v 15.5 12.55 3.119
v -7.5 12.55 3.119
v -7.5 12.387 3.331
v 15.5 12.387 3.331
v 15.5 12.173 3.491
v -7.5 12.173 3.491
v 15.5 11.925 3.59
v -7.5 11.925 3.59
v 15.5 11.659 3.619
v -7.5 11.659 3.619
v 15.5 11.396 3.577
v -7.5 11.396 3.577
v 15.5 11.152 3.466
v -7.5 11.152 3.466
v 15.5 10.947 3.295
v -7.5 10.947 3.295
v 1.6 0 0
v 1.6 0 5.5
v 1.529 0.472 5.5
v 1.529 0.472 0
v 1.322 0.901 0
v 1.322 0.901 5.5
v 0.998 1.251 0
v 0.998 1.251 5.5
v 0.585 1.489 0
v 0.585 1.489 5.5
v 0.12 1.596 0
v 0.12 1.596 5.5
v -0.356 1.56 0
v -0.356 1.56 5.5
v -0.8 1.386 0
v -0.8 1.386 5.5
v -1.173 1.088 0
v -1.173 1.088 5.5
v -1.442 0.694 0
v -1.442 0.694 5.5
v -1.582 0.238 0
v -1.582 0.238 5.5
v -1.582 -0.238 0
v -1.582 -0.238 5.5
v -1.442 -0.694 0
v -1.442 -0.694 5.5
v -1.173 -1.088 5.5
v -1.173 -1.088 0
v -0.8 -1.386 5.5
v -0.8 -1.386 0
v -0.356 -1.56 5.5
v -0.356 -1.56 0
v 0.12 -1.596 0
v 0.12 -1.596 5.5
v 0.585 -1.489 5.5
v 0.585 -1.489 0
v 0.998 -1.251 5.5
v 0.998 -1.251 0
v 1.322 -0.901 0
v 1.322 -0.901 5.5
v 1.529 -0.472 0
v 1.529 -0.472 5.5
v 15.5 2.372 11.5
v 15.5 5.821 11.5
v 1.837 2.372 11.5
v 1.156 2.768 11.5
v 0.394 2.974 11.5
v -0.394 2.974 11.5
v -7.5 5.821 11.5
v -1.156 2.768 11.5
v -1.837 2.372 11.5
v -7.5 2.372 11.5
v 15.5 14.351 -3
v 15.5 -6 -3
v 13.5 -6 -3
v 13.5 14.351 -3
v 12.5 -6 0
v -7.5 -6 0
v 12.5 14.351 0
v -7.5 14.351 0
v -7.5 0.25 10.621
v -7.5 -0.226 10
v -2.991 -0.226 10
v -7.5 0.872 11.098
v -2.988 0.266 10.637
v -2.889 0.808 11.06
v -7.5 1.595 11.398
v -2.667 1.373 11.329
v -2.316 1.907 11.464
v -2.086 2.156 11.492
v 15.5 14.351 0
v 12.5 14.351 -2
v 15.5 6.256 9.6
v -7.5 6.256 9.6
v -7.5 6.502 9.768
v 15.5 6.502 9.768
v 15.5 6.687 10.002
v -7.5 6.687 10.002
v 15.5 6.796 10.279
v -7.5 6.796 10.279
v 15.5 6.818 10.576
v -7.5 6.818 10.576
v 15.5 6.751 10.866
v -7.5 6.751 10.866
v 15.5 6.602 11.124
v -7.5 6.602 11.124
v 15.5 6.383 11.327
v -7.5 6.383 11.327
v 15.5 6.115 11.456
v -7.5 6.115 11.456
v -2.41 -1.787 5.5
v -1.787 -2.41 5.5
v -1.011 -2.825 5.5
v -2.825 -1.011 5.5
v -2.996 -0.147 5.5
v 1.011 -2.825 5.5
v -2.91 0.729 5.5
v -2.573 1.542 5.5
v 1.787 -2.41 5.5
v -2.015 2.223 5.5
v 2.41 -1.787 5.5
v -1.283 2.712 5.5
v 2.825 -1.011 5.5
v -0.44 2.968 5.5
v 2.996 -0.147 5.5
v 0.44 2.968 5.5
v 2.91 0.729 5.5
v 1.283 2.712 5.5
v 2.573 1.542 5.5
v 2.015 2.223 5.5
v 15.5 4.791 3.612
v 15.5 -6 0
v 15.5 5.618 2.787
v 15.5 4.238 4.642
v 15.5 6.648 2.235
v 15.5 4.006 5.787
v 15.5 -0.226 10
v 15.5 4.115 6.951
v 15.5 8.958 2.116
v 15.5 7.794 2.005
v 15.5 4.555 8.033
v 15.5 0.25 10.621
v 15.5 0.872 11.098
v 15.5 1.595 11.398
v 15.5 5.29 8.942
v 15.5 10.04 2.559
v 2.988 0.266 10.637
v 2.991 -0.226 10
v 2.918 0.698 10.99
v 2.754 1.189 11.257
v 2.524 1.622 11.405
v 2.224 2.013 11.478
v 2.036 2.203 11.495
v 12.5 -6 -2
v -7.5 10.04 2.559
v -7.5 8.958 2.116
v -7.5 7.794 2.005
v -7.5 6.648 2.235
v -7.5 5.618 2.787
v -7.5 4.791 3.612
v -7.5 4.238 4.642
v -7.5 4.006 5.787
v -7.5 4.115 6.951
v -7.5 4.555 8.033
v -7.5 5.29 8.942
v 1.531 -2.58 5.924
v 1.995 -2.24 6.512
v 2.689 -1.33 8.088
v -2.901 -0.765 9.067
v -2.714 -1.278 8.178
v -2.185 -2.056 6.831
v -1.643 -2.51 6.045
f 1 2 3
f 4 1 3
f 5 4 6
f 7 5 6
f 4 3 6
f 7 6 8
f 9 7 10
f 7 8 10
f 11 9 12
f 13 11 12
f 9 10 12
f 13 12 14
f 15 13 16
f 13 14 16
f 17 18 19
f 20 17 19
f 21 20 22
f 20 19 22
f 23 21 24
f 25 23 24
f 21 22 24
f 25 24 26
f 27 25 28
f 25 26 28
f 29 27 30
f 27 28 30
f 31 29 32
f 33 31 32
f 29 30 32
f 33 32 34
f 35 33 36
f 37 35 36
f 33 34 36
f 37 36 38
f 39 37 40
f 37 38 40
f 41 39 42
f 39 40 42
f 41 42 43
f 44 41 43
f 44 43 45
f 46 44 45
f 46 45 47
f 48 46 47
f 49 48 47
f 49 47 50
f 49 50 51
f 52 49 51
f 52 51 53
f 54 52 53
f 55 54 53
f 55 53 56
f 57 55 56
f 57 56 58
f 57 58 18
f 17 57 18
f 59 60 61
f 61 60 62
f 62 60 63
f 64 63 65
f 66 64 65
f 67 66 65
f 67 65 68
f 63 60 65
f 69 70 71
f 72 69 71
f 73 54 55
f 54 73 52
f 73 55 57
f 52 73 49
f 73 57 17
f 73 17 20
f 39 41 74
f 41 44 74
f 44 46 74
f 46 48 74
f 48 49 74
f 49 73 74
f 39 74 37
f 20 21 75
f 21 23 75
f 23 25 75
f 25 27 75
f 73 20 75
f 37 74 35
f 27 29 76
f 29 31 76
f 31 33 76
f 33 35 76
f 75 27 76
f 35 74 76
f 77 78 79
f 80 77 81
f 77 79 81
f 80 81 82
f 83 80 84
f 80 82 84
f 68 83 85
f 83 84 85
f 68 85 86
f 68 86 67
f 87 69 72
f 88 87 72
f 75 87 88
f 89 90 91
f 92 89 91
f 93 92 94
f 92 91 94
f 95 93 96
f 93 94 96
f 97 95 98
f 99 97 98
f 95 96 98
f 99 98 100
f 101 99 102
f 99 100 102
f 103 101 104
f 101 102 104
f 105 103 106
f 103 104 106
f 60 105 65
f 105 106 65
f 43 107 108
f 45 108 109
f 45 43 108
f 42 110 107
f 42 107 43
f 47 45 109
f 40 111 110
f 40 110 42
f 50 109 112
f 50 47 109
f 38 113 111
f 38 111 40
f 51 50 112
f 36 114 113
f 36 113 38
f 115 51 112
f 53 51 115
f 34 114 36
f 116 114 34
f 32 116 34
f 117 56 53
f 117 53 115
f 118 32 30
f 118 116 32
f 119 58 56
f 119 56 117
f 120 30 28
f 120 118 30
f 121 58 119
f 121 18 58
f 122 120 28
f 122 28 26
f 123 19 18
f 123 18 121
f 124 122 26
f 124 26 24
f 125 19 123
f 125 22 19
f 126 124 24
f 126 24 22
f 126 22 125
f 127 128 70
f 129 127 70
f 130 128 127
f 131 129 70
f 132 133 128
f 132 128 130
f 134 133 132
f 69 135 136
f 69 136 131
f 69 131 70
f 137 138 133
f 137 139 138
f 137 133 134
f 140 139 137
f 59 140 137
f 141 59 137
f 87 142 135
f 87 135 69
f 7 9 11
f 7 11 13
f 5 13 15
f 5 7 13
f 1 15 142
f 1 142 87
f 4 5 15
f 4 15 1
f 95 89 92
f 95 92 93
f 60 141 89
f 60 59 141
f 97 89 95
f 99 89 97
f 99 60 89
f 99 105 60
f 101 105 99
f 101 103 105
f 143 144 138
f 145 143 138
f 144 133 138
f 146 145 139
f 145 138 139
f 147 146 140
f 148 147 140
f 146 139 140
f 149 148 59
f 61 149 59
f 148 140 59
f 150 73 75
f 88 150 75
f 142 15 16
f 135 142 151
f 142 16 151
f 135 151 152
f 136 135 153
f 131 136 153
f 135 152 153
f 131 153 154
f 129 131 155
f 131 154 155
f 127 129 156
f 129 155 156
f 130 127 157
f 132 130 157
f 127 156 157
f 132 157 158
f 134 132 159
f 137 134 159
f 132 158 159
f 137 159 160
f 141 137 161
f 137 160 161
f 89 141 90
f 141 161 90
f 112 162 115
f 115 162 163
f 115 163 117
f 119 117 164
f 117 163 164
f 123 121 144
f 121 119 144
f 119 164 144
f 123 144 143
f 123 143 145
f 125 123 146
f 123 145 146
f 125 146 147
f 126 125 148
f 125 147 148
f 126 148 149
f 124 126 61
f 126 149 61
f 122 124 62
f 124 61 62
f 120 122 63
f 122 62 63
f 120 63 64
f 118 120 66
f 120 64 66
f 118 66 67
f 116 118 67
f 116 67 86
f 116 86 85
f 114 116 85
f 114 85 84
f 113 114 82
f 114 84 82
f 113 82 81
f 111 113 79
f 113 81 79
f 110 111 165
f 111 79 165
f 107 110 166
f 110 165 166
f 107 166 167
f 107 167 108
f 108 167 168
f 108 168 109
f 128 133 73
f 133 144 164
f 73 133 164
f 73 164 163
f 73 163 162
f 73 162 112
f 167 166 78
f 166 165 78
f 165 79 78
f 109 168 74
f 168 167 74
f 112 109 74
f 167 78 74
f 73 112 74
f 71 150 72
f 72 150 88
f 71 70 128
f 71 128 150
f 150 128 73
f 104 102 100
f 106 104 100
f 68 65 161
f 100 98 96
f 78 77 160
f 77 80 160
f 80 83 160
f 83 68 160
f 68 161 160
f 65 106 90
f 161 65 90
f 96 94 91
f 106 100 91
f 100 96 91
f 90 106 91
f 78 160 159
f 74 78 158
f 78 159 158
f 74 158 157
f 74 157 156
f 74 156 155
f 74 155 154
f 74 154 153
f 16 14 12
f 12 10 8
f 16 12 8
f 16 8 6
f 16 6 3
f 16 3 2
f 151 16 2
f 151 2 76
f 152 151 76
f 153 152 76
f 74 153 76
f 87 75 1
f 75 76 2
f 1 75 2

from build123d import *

# Parameters (mm, degrees)
EXTRUDE_1_DEPTH      = 15.5
EXTRUDE_1_DEPTH_BACK = 7.5
SKETCH_2_R           = 1.6
CUT_EXTRUDE_1_DEPTH  = 25.050924737
SKETCH_3_R           = 3
CUT_EXTRUDE_2_DEPTH  = 6
SKETCH_4_W           = 3
SKETCH_4_H           = 20.350852961
EXTRUDE_2_DEPTH      = 3
FILLET_1_R           = 3
CHAMFER_2_SIZE       = 1


with BuildPart() as part:
    # 草图1 → 凸台-拉伸1 (new, two sides: drawn at the far end of the back side and taken through both)
    with BuildSketch(Plane(origin=(0, 0, 0), x_dir=(0, 0, -1), z_dir=(1, 0, 0)).offset(-EXTRUDE_1_DEPTH_BACK)):
        with BuildLine():
            Line((0, 0), (0, 14.350852961))
            Line((0, 14.350852961), (-3.11932209, 12.549911513))
            ThreePointArc((-3.11932209, 12.549911513), (-3.613338081, 11.79312076), (-3.295457672, 10.947108887))
            ThreePointArc((-3.295457672, 10.947108887), (-3.612312045, 4.790802869), (-9.6, 6.256440423))
            ThreePointArc((-9.6, 6.256440423), (-10.723606798, 6.795229963), (-11.5, 5.820550528))
            Line((-11.5, 5.820550528), (-11.5, 0.639528096))
            Line((-11.5, 0.639528096), (0, -6))
            Line((0, -6), (0, 0))
        make_face()
    extrude(amount=EXTRUDE_1_DEPTH + EXTRUDE_1_DEPTH_BACK)

    # 草图2 → 切除-拉伸1 (cut, through all)
    with BuildSketch(Plane.XY.offset(11.5)):
        Circle(SKETCH_2_R)
    extrude(amount=-CUT_EXTRUDE_1_DEPTH, mode=Mode.SUBTRACT)

    # 草图3 → 切除-拉伸2 (cut)
    with BuildSketch(Plane.XY.offset(11.5)):
        Circle(SKETCH_3_R)
    extrude(amount=-CUT_EXTRUDE_2_DEPTH, mode=Mode.SUBTRACT)

    # 草图4 → 凸台-拉伸2 (add)
    with BuildSketch(Plane(origin=(0, 0, 0), x_dir=(-1, 0, 0), z_dir=(0, 0, -1))):
        with Locations((-14, 4.175426481)):
            Rectangle(SKETCH_4_W, SKETCH_4_H)
    extrude(amount=EXTRUDE_2_DEPTH)

    # 圆角1
    fillet_1_edges = [part.edges().sort_by_distance(p)[0] for p in [
        (9.215520711, 0.639528096, 11.5),
        (-5.215520711, 0.639528096, 11.5),
    ]]
    fillet(fillet_1_edges, radius=FILLET_1_R)

    # 倒角2
    chamfer_2_edges = [part.edges().sort_by_distance(p)[0] for p in [
        (12.5, 4.175426481, -3),
    ]]
    chamfer(chamfer_2_edges, length=CHAMFER_2_SIZE)


solid = part.part
